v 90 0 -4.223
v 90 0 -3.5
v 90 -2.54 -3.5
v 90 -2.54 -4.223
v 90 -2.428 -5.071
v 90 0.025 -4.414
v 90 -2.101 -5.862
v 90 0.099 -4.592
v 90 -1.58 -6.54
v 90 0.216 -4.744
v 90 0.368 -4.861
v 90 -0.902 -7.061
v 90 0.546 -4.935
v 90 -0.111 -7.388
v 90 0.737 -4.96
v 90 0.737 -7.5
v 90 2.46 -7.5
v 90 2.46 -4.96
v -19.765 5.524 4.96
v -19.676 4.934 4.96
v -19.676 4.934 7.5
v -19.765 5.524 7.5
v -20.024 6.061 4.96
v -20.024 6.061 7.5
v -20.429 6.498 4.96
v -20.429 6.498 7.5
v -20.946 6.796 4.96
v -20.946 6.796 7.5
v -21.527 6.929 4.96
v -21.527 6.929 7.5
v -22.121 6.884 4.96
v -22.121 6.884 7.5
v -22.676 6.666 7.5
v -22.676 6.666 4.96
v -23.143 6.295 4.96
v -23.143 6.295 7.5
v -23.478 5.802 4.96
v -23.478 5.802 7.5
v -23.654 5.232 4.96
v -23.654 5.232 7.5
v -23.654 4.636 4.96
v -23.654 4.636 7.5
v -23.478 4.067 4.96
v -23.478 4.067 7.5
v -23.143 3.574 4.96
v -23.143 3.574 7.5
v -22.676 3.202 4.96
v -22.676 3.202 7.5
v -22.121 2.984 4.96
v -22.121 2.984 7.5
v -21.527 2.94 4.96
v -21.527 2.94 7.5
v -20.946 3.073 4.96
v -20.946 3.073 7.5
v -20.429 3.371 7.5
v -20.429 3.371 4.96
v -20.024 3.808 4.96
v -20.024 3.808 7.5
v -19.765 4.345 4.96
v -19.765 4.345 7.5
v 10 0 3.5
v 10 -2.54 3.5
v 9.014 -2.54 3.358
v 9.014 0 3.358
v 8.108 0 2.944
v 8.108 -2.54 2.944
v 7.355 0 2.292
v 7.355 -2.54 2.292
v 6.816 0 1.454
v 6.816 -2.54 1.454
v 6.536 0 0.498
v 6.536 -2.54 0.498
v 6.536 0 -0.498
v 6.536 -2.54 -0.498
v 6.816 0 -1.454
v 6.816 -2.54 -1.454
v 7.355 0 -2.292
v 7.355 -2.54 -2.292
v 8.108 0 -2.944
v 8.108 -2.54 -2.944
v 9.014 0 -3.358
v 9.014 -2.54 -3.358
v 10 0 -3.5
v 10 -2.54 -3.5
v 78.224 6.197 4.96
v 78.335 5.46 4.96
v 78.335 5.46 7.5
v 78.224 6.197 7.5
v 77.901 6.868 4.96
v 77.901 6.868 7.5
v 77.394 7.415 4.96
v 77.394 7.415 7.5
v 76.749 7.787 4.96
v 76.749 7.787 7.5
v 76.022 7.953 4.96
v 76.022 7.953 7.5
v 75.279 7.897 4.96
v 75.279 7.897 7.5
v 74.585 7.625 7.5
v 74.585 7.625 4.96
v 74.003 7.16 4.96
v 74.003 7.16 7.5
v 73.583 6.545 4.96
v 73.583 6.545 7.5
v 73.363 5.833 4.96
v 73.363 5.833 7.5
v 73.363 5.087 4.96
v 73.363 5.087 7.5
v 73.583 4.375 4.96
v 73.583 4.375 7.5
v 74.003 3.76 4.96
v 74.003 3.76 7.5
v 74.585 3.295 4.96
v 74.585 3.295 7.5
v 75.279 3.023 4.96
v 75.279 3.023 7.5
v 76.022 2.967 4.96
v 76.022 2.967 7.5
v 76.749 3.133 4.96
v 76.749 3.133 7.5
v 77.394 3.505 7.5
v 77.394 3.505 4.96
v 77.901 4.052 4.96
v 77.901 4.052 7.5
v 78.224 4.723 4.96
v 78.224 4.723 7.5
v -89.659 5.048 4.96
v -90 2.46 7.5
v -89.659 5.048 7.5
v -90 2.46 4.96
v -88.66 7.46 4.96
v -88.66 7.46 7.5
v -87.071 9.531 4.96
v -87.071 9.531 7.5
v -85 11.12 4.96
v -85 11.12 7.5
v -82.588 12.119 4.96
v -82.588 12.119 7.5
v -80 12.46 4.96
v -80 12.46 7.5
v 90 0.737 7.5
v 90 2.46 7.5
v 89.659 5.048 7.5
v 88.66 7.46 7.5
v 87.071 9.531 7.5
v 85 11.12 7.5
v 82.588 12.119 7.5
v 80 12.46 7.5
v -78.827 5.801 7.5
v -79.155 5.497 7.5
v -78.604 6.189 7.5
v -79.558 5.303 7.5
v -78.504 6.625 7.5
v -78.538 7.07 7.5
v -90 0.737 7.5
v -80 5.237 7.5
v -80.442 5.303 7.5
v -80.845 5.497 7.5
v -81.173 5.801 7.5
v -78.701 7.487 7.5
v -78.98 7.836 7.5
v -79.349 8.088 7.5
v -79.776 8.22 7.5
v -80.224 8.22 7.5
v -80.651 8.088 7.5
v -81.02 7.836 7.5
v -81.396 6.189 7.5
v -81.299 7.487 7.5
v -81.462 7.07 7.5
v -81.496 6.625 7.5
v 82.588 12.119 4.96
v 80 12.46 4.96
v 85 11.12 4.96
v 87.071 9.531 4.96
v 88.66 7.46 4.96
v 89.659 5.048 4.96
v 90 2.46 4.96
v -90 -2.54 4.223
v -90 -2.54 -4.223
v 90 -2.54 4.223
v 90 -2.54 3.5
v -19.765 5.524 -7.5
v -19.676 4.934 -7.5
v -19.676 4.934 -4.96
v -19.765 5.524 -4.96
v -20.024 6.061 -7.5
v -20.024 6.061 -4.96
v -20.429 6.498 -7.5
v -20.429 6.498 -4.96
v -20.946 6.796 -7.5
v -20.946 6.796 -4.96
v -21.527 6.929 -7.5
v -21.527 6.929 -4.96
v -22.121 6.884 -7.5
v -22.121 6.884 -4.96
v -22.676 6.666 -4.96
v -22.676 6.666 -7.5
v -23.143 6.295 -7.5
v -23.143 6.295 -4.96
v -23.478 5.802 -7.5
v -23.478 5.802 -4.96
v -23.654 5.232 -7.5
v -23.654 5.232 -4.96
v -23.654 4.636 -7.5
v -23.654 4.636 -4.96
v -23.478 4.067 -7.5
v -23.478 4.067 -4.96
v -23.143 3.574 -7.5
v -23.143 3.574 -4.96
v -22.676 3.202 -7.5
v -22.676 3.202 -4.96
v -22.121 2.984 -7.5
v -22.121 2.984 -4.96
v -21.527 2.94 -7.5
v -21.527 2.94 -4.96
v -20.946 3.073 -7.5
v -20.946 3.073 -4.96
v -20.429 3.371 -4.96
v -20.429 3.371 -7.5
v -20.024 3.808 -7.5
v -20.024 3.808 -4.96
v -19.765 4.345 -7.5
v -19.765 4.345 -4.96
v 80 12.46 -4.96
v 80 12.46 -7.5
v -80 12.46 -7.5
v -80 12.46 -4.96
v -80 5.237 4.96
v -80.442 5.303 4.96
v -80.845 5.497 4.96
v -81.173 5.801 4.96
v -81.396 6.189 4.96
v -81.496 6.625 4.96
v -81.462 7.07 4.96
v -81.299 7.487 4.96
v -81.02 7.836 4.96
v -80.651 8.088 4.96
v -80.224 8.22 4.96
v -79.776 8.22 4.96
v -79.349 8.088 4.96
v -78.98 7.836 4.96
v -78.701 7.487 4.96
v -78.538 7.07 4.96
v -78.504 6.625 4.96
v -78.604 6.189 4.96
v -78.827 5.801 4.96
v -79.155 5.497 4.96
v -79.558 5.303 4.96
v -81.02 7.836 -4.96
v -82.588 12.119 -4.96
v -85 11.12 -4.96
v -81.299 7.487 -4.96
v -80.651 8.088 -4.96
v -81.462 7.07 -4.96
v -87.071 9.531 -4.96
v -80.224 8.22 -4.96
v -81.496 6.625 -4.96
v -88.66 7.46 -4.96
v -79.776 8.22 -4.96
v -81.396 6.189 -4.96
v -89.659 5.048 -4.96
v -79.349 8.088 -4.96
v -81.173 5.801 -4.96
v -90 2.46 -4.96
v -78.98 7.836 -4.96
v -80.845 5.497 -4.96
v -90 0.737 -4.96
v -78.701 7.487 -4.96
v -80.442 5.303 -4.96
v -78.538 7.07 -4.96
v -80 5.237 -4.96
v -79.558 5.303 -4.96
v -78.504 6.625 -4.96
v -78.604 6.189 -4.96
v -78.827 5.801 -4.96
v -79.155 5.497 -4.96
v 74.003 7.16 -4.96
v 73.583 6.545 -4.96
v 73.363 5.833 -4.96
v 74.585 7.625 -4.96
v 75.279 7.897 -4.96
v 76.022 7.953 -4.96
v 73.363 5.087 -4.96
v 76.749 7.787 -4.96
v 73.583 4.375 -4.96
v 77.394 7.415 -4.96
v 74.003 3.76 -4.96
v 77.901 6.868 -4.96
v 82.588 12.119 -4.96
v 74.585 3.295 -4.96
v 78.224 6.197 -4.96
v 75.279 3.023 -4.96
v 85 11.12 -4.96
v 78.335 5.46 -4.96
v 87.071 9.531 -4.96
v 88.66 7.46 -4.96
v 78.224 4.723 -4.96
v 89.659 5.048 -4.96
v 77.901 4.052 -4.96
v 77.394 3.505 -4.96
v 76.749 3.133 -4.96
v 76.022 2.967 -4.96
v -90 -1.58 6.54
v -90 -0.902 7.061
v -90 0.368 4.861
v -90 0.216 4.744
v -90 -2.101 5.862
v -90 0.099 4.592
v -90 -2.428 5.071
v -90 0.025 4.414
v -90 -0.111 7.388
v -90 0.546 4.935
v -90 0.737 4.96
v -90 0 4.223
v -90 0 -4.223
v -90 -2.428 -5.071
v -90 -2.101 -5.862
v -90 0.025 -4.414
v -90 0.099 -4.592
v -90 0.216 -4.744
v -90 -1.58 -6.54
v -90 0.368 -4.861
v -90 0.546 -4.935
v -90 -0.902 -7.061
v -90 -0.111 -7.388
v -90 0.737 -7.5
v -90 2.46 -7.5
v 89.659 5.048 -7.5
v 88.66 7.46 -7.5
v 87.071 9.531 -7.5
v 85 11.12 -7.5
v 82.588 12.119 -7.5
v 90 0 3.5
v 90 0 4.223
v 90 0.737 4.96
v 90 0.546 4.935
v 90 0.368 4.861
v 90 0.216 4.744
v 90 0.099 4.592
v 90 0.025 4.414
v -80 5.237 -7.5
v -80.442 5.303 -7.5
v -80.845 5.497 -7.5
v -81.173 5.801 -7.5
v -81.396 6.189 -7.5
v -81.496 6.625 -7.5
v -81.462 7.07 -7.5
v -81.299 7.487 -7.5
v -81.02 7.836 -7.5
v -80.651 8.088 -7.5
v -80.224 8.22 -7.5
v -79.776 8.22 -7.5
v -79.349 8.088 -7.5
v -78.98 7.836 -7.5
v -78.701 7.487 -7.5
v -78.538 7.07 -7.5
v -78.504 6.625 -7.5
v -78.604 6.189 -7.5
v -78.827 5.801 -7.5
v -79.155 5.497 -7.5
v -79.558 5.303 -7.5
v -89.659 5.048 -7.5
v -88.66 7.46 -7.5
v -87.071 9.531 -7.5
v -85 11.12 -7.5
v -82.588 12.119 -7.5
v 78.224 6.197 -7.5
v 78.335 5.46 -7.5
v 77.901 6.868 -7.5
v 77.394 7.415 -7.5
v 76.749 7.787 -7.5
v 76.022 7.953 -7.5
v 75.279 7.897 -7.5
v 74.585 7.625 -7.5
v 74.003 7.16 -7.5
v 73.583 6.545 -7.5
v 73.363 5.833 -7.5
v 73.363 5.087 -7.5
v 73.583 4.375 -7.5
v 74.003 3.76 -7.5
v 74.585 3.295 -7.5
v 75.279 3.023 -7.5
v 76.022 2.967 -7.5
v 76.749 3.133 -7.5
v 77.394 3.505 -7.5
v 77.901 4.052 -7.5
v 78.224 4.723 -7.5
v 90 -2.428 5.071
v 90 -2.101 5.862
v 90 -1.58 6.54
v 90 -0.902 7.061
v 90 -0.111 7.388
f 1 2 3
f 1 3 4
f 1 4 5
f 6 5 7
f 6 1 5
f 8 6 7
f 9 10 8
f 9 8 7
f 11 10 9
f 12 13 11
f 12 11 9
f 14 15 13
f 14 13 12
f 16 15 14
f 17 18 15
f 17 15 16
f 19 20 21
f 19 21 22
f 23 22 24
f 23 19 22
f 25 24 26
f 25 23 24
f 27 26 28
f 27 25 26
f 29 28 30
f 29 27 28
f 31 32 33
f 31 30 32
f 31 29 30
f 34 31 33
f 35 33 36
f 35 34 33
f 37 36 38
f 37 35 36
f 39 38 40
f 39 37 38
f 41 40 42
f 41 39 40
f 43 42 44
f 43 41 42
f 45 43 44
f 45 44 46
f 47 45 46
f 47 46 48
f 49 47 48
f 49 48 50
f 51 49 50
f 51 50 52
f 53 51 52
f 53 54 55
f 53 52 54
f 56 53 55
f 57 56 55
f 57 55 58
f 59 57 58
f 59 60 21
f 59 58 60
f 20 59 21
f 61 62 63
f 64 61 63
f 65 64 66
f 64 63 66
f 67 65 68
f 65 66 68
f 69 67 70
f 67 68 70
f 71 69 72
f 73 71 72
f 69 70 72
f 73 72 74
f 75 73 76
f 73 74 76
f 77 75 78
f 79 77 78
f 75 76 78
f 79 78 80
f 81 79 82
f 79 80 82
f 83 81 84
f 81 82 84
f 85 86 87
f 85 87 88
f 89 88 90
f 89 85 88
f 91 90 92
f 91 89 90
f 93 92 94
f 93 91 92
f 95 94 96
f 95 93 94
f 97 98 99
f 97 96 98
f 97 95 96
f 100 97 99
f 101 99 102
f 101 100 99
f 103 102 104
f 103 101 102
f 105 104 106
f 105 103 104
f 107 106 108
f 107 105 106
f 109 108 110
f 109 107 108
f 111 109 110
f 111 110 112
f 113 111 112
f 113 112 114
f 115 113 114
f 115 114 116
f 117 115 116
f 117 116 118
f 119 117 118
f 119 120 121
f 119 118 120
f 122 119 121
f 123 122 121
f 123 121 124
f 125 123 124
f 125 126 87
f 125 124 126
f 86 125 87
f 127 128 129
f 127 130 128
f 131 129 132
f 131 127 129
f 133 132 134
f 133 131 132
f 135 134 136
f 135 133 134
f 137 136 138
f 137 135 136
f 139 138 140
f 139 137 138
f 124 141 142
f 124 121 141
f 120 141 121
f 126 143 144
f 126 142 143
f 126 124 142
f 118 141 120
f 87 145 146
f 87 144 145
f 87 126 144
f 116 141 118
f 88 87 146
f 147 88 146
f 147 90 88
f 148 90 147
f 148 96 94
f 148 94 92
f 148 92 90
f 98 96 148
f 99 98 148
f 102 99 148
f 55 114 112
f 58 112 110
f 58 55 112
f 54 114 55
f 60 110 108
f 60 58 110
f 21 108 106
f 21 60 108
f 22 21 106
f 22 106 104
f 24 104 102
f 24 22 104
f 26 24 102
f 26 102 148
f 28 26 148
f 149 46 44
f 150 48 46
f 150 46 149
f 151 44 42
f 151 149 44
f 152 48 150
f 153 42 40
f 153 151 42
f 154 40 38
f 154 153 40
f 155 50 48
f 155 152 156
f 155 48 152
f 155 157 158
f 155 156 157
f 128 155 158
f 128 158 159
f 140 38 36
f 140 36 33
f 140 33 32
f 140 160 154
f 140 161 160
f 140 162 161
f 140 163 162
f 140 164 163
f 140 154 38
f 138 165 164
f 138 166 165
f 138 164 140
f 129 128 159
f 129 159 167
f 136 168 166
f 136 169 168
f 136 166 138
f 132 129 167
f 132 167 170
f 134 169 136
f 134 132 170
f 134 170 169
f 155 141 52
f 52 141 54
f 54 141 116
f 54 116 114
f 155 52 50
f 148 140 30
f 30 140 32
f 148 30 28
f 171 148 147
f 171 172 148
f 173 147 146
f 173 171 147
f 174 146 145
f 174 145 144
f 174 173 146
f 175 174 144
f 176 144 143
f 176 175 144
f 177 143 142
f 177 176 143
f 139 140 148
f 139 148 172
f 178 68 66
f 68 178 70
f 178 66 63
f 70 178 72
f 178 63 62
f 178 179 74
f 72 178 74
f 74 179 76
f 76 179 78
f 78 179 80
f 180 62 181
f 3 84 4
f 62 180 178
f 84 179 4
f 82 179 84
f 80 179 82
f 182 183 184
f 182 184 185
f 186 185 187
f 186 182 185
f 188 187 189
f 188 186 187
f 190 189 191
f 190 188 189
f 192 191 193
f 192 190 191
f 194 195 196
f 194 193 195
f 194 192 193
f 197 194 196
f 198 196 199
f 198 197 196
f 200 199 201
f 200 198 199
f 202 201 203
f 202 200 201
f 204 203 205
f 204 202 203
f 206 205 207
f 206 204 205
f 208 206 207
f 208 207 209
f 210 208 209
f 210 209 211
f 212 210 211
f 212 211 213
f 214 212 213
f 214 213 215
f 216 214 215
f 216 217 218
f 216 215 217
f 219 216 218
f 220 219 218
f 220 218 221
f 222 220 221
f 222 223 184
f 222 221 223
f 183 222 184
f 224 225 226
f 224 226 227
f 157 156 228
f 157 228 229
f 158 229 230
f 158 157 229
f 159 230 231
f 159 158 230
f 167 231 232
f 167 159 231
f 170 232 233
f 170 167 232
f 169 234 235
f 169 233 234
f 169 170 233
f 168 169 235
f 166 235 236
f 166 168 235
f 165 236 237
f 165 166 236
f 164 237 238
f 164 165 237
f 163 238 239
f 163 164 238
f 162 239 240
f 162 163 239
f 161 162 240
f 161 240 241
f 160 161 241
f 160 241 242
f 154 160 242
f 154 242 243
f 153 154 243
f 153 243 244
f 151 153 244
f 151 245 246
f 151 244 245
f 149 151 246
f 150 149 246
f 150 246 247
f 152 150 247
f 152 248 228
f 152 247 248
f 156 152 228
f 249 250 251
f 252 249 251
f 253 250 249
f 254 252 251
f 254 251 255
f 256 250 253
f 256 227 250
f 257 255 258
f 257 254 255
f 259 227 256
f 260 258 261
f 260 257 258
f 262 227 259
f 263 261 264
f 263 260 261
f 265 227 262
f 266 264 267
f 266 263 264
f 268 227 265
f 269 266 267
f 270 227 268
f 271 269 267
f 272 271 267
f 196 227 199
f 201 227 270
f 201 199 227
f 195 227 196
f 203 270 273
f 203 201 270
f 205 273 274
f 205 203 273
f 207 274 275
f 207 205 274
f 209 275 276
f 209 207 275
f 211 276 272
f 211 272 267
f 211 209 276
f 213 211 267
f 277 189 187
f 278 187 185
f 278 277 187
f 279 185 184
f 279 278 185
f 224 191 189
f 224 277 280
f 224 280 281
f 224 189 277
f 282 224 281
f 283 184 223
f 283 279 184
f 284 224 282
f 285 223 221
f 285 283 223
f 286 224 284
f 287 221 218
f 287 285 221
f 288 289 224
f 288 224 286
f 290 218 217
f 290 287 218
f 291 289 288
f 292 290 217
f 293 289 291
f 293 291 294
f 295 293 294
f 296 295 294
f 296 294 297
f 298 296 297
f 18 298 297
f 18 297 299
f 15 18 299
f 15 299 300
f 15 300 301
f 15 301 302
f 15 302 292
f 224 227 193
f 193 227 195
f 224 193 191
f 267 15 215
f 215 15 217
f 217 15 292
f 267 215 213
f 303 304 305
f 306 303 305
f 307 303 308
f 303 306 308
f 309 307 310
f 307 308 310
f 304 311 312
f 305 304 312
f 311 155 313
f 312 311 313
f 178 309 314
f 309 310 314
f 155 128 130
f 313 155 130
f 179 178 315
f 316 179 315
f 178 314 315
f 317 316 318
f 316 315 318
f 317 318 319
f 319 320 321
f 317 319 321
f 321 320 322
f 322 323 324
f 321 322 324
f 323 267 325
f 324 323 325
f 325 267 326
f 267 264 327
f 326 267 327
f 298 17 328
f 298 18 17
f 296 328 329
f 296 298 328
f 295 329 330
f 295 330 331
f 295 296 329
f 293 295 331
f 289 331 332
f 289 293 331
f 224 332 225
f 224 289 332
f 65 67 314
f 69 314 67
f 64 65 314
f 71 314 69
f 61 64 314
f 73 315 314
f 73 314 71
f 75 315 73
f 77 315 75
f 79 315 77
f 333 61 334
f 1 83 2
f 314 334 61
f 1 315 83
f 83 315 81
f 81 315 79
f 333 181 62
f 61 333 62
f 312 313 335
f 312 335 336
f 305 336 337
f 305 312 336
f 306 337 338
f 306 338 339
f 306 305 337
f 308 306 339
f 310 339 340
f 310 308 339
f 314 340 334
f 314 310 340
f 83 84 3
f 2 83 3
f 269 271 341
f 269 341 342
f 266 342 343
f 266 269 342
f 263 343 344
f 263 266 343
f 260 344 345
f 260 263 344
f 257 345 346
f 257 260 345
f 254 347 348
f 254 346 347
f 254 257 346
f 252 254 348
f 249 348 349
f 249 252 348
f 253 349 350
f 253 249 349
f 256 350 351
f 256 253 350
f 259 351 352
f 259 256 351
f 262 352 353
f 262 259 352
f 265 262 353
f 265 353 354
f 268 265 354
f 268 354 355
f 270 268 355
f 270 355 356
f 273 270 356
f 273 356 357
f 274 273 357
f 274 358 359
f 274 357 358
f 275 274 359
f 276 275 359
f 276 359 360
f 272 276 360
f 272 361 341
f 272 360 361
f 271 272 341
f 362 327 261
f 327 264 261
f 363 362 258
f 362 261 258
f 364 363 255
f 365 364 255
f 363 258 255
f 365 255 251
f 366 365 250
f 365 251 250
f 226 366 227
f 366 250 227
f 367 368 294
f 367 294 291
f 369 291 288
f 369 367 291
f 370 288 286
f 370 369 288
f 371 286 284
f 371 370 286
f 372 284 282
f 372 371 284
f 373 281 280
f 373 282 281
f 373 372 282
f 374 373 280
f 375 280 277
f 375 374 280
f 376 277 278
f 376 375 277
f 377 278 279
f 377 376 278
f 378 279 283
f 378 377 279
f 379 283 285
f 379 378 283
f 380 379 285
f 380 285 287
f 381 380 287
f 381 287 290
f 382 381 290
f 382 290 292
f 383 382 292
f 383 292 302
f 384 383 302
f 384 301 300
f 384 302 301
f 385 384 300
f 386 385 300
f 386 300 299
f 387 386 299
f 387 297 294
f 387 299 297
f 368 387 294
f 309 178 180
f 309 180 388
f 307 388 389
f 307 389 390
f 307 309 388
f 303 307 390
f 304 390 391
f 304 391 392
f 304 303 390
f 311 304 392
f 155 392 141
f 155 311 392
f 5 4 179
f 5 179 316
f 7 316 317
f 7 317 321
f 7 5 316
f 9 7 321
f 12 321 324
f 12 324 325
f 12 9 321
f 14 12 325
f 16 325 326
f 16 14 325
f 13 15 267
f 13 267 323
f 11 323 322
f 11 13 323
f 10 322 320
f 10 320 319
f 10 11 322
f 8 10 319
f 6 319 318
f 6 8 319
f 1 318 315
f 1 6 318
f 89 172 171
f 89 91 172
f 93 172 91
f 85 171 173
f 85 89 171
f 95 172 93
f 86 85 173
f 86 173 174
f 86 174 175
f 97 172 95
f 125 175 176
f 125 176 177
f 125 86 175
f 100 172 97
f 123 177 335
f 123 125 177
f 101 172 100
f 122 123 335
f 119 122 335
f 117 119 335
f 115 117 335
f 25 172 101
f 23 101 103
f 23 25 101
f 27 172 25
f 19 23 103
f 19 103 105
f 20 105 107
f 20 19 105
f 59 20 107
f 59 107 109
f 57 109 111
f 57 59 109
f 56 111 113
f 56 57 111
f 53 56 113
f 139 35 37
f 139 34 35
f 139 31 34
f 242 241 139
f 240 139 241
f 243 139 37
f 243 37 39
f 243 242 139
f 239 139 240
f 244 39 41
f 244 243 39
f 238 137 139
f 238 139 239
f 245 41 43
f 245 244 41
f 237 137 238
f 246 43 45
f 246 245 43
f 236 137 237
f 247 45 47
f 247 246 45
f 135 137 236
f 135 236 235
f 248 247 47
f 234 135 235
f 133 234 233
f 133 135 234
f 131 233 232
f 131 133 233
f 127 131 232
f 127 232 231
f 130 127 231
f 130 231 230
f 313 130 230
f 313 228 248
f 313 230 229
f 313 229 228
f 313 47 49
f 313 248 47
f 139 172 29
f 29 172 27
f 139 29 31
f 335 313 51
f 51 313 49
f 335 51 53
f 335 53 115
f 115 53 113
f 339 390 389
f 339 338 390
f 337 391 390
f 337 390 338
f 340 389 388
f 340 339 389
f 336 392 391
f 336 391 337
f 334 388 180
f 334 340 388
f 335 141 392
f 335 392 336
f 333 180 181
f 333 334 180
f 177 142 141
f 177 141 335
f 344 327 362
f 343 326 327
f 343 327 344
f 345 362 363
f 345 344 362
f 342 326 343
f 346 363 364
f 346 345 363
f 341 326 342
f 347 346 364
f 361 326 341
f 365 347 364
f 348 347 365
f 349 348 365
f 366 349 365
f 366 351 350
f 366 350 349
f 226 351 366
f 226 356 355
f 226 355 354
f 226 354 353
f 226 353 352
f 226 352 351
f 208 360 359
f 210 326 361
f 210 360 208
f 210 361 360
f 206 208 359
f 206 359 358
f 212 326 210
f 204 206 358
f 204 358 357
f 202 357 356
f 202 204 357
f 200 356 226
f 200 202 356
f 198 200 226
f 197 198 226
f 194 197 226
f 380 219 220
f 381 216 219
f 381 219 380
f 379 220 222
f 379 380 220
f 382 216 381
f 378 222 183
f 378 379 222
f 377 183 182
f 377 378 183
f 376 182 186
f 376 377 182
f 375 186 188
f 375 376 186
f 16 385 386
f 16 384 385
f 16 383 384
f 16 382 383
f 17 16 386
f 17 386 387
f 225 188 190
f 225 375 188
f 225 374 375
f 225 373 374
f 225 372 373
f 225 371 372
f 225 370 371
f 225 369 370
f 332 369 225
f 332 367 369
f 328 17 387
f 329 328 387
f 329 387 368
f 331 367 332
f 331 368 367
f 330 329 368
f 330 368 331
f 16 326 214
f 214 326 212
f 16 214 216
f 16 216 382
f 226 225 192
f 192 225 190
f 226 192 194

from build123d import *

# Parameters (mm, degrees)
SKETCH1_W                    = 180
SKETCH1_H                    = 15
BASE_FLANGE1_DEPTH           = 2.54
EDGE_FLANGE1_STRIP_W         = 11.6332
EDGE_FLANGE1_STRIP_H         = 2.54
EDGE_FLANGE1_STRIP_CUT_DEPTH = 180
EDGE_FLANGE1_DEPTH           = 180
EDGE_FLANGE2_STRIP_W         = 11.6332
EDGE_FLANGE2_STRIP_H         = 2.54
EDGE_FLANGE2_STRIP_CUT_DEPTH = 180
EDGE_FLANGE2_DEPTH           = 180
CUT_EXTRUDE3_DEPTH           = 92.167437169
CUT_EXTRUDE3_DEPTH_BACK      = 92.167437169
SKETCH12_R                   = 2.5
CUT_EXTRUDE4_DEPTH           = 92.167437169
CUT_EXTRUDE4_DEPTH_BACK      = 92.167437169
SKETCH16_R                   = 2
CUT_EXTRUDE6_DEPTH           = 92.549167118
FILLET1_R                    = 10
CUT_EXTRUDE7_DEPTH           = 93.088281556
CUT_EXTRUDE7_DEPTH_BACK      = 93.088281556
SKETCH18_R                   = 1.5


# Sheet-metal steps are written as plain solids
with BuildPart() as part:
    # Sketch1 → Base-Flange1 (new body)
    with BuildSketch(Plane(origin=(0, 0, 0), x_dir=(1, 0, 0), z_dir=(0, 1, 0))):
        Rectangle(SKETCH1_W, SKETCH1_H)
    extrude(amount=-BASE_FLANGE1_DEPTH)

    # Edge-Flange1 strip (across the edge) → Edge-Flange1 strip cut (cut)
    with BuildSketch(Plane(origin=(-90, 0, 7.5), x_dir=(0, 0, -1), z_dir=(1, 0, 0))):
        with Locations((-2.54, -1.27)):
            Rectangle(EDGE_FLANGE1_STRIP_W, EDGE_FLANGE1_STRIP_H)
    extrude(amount=EDGE_FLANGE1_STRIP_CUT_DEPTH, mode=Mode.SUBTRACT)

    # Edge-Flange1 section (across the edge) → Edge-Flange1 (add)
    with BuildSketch(Plane(origin=(-90, 0, 7.5), x_dir=(0, 0, -1), z_dir=(1, 0, 0))):
        with BuildLine():
            Line((0, 0.7366), (0, 12.46))
            Line((0, 12.46), (2.54, 12.46))
            Line((2.54, 12.46), (2.54, 0.7366))
            ThreePointArc((2.54, 0.7366), (2.755745145, 0.215745145), (3.2766, 0))
            Line((3.2766, 0), (3.2766, -2.54))
            ThreePointArc((3.2766, -2.54), (0.959693921, -1.580306079), (0, 0.7366))
        make_face()
    extrude(amount=EDGE_FLANGE1_DEPTH)

    # Edge-Flange2 strip (across the edge) → Edge-Flange2 strip cut (cut)
    with BuildSketch(Plane(origin=(90, 0, -7.5), x_dir=(0, 0, 1), z_dir=(-1, 0, 0))):
        with Locations((-2.54, -1.27)):
            Rectangle(EDGE_FLANGE2_STRIP_W, EDGE_FLANGE2_STRIP_H)
    extrude(amount=EDGE_FLANGE2_STRIP_CUT_DEPTH, mode=Mode.SUBTRACT)

    # Edge-Flange2 section (across the edge) → Edge-Flange2 (add)
    with BuildSketch(Plane(origin=(90, 0, -7.5), x_dir=(0, 0, 1), z_dir=(-1, 0, 0))):
        with BuildLine():
            Line((0, 0.7366), (0, 12.46))
            Line((0, 12.46), (2.54, 12.46))
            Line((2.54, 12.46), (2.54, 0.7366))
            ThreePointArc((2.54, 0.7366), (2.755745145, 0.215745145), (3.2766, 0))
            Line((3.2766, 0), (3.2766, -2.54))
            ThreePointArc((3.2766, -2.54), (0.959693921, -1.580306079), (0, 0.7366))
        make_face()
    extrude(amount=EDGE_FLANGE2_DEPTH)

    # Sketch12 → Cut-Extrude3 (cut, two sides: drawn at the far end of the back side and taken through both)
    with BuildSketch(Plane.XY.offset(-CUT_EXTRUDE3_DEPTH_BACK)):
        with Locations((75.835364308, 5.46)):
            Circle(SKETCH12_R)
    extrude(amount=CUT_EXTRUDE3_DEPTH + CUT_EXTRUDE3_DEPTH_BACK, mode=Mode.SUBTRACT)

    # Sketch16 → Cut-Extrude4 (cut, two sides: drawn at the far end of the back side and taken through both)
    with BuildSketch(Plane.XY.offset(-CUT_EXTRUDE4_DEPTH_BACK)):
        with Locations((-21.676425181, 4.934342186)):
            Circle(SKETCH16_R)
    extrude(amount=CUT_EXTRUDE4_DEPTH + CUT_EXTRUDE4_DEPTH_BACK, mode=Mode.SUBTRACT)

    # Sketch17 → Cut-Extrude6 (cut, through all)
    with BuildSketch(Plane.XZ.offset(2.54)):
        with BuildLine():
            Line((90, -3.5), (90, 3.5))
            Line((90, 3.5), (10, 3.5))
            ThreePointArc((10, 3.5), (12.474873734, 2.474873734), (13.5, 0))
            ThreePointArc((13.5, 0), (12.474873734, -2.474873734), (10, -3.5))
            Line((10, -3.5), (90, -3.5))
        make_face()
        with BuildLine():
            ThreePointArc((13.5, 0), (12.474873734, 2.474873734), (10, 3.5))
            Line((10, 3.5), (10, -3.5))
            ThreePointArc((10, -3.5), (12.474873734, -2.474873734), (13.5, 0))
        make_face()
        with BuildLine():
            Line((10, -3.5), (10, 3.5))
            ThreePointArc((10, 3.5), (6.5, 0), (10, -3.5))
        make_face()
    extrude(amount=-CUT_EXTRUDE6_DEPTH, mode=Mode.SUBTRACT)

    # Fillet1
    fillet1_edges = [part.edges().sort_by_distance(p)[0] for p in [
        (-90, 12.46, 6.23),
        (90, 12.46, 6.23),
        (90, 12.46, -6.23),
        (-90, 12.46, -6.23),
    ]]
    fillet(fillet1_edges, radius=FILLET1_R)

    # Sketch18 → Cut-Extrude7 (cut, two sides: drawn at the far end of the back side and taken through both)
    with BuildSketch(Plane(origin=(0, 0, -7.5), x_dir=(-1, 0, 0), z_dir=(0, 0, -1)).offset(-CUT_EXTRUDE7_DEPTH_BACK)):
        with Locations(Location((80, 6.7366, 0), (0, 0, 270))):
            Circle(SKETCH18_R)
    extrude(amount=CUT_EXTRUDE7_DEPTH + CUT_EXTRUDE7_DEPTH_BACK, mode=Mode.SUBTRACT)


solid = part.part
